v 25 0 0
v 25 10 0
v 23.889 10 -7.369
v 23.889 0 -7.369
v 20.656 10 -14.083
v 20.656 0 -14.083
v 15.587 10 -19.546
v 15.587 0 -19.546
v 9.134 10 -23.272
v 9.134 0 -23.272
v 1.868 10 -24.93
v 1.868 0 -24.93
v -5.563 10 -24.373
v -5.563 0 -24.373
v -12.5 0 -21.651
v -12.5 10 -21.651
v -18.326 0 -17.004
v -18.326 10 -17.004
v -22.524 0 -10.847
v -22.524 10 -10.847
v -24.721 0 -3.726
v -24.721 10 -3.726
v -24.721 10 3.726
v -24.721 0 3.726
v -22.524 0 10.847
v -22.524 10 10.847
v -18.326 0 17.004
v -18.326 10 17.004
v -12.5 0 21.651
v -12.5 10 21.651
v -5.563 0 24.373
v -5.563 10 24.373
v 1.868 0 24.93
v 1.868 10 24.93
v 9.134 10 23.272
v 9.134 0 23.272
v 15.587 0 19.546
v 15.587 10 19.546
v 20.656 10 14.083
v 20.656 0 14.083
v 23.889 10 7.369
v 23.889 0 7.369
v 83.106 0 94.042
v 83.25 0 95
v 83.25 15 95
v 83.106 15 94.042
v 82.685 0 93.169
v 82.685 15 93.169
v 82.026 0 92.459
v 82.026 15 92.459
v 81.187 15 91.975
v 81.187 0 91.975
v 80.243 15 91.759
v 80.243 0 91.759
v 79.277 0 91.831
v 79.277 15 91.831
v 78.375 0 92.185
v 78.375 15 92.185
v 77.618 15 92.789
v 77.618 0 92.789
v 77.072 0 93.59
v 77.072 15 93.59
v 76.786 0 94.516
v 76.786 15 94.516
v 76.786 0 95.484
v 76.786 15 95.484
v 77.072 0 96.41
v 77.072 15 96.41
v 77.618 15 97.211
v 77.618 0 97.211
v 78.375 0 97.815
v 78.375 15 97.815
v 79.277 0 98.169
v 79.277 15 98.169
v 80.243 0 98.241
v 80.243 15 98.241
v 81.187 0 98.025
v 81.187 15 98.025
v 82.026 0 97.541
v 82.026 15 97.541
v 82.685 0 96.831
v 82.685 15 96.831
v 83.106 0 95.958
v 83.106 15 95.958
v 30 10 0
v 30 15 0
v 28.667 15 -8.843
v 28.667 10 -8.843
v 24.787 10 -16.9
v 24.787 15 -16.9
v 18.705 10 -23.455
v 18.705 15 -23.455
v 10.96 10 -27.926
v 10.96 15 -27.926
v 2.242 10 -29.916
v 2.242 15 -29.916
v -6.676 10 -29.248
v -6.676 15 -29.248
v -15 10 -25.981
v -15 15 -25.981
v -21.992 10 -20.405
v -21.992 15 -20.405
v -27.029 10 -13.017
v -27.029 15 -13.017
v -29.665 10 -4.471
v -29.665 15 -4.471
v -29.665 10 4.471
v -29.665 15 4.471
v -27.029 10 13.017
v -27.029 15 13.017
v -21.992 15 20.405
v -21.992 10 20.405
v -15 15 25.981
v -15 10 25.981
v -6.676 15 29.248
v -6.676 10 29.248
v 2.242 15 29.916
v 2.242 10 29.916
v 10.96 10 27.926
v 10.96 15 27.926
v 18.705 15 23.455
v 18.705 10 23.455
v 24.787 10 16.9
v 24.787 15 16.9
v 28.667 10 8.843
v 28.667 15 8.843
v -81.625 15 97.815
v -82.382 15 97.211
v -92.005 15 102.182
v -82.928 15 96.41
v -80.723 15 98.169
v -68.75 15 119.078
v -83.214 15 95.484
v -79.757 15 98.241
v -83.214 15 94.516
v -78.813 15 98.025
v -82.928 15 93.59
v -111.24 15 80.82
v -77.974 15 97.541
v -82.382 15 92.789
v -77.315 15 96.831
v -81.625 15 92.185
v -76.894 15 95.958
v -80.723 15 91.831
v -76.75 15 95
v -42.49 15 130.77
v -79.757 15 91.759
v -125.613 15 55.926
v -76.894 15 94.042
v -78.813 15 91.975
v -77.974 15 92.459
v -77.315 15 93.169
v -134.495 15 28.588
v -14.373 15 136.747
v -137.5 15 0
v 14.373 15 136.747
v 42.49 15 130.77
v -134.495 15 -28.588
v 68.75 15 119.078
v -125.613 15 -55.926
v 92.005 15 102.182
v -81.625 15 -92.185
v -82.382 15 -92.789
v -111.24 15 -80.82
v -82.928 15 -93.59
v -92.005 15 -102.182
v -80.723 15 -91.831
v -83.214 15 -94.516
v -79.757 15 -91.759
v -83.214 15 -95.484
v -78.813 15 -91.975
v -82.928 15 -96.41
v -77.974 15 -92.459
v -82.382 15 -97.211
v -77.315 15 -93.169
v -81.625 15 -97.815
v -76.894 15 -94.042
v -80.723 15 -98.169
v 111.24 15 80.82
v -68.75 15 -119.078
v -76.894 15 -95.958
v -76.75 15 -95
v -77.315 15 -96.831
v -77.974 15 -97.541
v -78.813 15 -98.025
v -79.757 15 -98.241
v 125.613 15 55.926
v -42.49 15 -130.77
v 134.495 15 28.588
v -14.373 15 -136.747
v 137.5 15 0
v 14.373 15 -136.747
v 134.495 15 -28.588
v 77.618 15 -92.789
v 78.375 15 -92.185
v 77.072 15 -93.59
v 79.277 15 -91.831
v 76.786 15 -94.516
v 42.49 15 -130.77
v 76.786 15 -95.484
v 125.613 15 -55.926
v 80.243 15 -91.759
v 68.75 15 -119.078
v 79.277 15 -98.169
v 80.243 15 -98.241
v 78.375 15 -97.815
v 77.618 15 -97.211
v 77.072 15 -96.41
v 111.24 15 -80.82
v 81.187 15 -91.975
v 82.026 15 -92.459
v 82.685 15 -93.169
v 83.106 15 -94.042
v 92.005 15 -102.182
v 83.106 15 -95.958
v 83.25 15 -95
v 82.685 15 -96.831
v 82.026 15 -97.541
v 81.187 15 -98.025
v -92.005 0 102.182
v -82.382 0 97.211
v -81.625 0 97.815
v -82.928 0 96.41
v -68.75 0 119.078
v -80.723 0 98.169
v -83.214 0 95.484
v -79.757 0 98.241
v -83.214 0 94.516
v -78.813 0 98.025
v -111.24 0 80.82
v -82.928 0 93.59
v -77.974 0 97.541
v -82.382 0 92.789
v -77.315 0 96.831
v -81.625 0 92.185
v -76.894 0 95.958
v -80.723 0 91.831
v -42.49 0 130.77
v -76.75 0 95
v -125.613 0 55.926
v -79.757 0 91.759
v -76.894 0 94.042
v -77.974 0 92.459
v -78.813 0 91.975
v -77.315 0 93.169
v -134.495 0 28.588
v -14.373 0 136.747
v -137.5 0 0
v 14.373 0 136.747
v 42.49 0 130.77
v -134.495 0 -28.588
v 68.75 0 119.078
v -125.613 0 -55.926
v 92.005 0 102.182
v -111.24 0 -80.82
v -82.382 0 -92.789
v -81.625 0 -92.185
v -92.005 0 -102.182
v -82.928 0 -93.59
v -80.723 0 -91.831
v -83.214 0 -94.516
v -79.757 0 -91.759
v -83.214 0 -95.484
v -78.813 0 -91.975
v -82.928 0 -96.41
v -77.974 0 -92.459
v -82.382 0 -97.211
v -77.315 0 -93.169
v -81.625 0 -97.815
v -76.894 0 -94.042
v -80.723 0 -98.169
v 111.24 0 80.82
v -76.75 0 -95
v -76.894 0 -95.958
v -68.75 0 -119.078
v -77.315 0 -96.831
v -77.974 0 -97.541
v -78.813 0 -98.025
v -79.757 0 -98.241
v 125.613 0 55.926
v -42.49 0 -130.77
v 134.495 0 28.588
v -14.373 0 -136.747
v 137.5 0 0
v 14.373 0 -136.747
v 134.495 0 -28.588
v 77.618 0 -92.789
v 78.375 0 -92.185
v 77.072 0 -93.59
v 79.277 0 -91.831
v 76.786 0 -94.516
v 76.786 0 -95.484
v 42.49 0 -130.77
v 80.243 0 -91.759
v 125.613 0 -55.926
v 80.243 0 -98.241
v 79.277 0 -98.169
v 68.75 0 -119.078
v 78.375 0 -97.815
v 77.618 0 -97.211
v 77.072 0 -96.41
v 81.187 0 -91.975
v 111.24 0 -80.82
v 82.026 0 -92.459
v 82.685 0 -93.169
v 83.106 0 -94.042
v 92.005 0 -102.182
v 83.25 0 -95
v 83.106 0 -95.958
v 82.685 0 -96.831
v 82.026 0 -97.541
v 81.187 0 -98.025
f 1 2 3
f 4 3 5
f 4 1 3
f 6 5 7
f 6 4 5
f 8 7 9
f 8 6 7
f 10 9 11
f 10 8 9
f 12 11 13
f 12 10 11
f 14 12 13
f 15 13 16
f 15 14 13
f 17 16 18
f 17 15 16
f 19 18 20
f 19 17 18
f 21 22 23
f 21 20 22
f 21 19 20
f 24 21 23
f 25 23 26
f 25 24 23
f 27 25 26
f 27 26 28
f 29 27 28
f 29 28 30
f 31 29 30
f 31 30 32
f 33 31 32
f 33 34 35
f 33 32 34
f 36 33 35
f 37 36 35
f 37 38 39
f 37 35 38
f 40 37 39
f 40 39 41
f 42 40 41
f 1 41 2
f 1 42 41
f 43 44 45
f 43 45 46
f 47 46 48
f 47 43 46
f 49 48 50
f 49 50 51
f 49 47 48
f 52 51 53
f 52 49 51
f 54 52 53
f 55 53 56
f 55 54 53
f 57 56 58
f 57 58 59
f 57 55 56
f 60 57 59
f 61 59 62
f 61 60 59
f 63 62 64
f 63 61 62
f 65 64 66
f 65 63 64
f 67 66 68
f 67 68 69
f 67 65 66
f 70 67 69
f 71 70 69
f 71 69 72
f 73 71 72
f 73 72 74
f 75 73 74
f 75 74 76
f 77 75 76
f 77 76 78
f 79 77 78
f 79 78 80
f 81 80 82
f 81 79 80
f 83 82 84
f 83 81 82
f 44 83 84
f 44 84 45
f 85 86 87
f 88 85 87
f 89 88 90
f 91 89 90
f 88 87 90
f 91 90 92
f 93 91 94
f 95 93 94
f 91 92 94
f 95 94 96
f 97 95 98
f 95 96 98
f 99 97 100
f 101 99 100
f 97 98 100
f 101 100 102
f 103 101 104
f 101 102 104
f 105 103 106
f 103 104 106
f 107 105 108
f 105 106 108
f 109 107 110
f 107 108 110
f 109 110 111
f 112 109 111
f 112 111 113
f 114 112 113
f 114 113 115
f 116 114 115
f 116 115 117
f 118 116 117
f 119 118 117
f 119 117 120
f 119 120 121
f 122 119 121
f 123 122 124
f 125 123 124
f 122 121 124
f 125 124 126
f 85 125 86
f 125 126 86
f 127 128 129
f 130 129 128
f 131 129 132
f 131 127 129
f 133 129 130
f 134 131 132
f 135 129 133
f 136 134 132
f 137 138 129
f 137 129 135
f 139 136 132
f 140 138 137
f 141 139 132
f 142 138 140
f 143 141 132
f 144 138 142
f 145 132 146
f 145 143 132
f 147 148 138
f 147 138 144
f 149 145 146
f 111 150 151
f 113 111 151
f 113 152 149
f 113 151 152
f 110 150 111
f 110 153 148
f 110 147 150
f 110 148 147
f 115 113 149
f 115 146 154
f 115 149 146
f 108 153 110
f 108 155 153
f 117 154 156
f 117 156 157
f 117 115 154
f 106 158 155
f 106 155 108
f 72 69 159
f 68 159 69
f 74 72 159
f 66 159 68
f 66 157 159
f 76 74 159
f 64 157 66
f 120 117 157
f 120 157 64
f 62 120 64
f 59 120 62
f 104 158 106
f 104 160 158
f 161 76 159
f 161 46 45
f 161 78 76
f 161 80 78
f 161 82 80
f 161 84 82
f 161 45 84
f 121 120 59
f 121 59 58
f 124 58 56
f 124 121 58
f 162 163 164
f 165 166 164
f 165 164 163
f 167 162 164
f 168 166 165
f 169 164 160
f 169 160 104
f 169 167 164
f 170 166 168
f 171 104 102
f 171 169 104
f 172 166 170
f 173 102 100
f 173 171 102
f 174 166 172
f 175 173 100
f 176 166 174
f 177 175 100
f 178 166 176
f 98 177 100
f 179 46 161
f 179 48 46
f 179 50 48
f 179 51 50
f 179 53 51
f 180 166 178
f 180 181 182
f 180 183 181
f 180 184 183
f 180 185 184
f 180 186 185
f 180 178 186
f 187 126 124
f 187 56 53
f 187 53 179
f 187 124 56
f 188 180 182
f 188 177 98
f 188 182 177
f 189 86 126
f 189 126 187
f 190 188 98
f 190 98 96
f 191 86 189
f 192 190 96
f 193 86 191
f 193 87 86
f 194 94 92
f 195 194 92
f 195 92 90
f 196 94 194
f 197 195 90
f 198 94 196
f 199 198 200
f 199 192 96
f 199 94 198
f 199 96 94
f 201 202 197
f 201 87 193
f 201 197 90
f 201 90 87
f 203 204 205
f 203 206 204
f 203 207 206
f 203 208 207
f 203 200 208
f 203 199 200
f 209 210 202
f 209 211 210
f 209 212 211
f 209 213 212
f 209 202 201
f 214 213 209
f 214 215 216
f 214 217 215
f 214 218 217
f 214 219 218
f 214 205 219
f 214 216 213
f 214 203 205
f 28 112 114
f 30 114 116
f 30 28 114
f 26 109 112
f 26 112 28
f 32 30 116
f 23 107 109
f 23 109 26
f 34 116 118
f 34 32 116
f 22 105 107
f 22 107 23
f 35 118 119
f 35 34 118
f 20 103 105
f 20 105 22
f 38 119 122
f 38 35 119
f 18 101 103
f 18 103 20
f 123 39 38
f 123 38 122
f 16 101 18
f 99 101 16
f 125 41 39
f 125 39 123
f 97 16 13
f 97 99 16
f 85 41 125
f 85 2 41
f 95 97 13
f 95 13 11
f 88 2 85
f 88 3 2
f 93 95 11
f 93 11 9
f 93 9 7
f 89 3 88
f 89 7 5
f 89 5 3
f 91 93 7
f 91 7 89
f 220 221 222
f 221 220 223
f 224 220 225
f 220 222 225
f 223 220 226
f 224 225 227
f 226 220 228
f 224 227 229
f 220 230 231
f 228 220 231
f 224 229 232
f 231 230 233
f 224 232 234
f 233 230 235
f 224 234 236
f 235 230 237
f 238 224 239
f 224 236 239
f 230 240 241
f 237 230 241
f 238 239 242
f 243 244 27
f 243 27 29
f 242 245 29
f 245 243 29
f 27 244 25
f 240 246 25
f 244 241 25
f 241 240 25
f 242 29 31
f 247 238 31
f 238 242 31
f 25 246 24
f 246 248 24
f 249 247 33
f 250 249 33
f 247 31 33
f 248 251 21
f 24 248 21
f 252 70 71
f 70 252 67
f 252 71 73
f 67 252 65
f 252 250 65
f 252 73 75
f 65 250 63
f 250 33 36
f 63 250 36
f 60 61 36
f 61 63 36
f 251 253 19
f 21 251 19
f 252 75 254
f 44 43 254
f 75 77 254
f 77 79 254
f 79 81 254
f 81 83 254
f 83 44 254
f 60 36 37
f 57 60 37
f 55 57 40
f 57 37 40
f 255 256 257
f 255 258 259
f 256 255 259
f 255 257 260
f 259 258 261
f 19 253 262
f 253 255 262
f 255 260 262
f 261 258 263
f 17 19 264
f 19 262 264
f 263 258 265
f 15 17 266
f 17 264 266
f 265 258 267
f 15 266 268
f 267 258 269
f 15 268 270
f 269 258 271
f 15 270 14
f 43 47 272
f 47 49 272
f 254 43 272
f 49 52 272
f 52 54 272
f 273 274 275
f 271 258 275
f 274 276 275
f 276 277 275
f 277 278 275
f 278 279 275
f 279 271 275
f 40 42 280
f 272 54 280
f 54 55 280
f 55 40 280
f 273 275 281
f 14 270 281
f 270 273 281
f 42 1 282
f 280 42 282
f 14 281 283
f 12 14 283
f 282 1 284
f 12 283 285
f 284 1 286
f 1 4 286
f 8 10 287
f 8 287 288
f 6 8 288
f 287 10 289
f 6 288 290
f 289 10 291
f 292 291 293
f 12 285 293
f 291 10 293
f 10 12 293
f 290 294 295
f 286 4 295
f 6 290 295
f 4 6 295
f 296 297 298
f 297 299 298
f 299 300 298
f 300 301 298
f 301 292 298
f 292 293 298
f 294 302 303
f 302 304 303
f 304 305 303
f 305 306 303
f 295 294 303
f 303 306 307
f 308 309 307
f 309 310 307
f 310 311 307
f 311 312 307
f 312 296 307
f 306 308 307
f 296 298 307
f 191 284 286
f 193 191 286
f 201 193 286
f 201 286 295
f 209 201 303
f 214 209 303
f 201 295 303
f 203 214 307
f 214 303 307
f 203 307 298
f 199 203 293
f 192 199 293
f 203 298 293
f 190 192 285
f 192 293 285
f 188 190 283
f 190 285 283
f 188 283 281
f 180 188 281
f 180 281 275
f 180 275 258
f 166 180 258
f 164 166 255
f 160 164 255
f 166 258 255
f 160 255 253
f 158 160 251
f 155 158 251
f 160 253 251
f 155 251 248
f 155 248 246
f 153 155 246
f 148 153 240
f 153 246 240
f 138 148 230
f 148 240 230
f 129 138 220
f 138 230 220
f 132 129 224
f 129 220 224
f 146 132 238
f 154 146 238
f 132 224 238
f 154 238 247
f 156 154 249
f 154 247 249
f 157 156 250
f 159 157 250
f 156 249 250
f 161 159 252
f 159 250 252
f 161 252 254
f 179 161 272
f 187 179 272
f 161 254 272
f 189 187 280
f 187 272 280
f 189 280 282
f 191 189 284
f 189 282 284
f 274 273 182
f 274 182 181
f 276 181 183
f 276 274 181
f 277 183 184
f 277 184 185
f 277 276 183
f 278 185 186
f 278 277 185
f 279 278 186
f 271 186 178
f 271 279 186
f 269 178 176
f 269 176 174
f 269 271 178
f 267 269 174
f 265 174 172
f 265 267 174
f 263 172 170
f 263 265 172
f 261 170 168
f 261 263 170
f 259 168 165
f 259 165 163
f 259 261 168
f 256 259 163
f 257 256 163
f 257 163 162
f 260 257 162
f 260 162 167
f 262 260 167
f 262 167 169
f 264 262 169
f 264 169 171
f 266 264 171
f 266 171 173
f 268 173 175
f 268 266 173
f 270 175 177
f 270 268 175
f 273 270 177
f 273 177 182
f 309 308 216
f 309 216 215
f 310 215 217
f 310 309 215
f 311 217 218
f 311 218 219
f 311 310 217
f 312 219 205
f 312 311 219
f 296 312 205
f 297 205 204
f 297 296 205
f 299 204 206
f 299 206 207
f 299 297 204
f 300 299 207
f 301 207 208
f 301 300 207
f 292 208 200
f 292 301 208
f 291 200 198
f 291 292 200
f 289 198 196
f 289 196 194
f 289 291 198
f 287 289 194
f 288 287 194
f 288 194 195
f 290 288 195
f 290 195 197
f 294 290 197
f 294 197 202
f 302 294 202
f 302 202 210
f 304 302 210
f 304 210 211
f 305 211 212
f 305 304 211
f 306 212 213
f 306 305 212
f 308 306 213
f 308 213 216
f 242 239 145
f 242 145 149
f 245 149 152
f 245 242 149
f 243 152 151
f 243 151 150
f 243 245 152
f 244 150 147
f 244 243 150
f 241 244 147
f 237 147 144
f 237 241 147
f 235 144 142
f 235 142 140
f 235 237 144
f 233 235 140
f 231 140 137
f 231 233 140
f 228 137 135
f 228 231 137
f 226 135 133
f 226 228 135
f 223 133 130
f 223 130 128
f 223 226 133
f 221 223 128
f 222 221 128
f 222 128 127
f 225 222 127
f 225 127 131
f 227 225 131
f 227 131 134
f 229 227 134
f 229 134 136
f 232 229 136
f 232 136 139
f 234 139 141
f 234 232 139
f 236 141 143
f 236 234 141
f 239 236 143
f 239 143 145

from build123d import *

# Parameters (mm, degrees)
BASESKETCH_R              = 137.5
BASE_DEPTH                = 15
MOUNTINGHOLES_R           = 3.25
CUT_EXTRUDE1_DEPTH        = 15
BEARINGJ1_R               = 25
CUT_EXTRUDE3_DEPTH        = 15
CUT_EXTRUDE4_START        = 15
BEARINGRADIALCONSTRAINT_R = 30
CUT_EXTRUDE4_DEPTH        = 5


with BuildPart() as part:
    # BaseSketch → Base (new body)
    with BuildSketch(Plane(origin=(0, 0, 0), x_dir=(1, 0, 0), z_dir=(0, 1, 0))):
        Circle(BASESKETCH_R)
    extrude(amount=BASE_DEPTH)

    # MountingHoles → Cut-Extrude1 (cut)
    with BuildSketch(Plane(origin=(0, 0, 0), x_dir=(1, 0, 0), z_dir=(0, 1, 0))):
        with Locations((-80, 95)):
            Circle(MOUNTINGHOLES_R)
        with Locations((-80, -95)):
            Circle(MOUNTINGHOLES_R)
        with Locations((80, -95)):
            Circle(MOUNTINGHOLES_R)
        with Locations((80, 95)):
            Circle(MOUNTINGHOLES_R)
    extrude(amount=CUT_EXTRUDE1_DEPTH, mode=Mode.SUBTRACT)

    # BearingJ1 → Cut-Extrude3 (cut)
    with BuildSketch(Plane(origin=(0, 0, 0), x_dir=(1, 0, 0), z_dir=(0, 1, 0))):
        Circle(BEARINGJ1_R)
    extrude(amount=CUT_EXTRUDE3_DEPTH, mode=Mode.SUBTRACT)

    # BearingRadialConstraint → Cut-Extrude4 (cut)
    with BuildSketch(Plane(origin=(0, 0, 0), x_dir=(1, 0, 0), z_dir=(0, 1, 0)).offset(CUT_EXTRUDE4_START)):
        Circle(BEARINGRADIALCONSTRAINT_R)
    extrude(amount=-CUT_EXTRUDE4_DEPTH, mode=Mode.SUBTRACT)


solid = part.part
